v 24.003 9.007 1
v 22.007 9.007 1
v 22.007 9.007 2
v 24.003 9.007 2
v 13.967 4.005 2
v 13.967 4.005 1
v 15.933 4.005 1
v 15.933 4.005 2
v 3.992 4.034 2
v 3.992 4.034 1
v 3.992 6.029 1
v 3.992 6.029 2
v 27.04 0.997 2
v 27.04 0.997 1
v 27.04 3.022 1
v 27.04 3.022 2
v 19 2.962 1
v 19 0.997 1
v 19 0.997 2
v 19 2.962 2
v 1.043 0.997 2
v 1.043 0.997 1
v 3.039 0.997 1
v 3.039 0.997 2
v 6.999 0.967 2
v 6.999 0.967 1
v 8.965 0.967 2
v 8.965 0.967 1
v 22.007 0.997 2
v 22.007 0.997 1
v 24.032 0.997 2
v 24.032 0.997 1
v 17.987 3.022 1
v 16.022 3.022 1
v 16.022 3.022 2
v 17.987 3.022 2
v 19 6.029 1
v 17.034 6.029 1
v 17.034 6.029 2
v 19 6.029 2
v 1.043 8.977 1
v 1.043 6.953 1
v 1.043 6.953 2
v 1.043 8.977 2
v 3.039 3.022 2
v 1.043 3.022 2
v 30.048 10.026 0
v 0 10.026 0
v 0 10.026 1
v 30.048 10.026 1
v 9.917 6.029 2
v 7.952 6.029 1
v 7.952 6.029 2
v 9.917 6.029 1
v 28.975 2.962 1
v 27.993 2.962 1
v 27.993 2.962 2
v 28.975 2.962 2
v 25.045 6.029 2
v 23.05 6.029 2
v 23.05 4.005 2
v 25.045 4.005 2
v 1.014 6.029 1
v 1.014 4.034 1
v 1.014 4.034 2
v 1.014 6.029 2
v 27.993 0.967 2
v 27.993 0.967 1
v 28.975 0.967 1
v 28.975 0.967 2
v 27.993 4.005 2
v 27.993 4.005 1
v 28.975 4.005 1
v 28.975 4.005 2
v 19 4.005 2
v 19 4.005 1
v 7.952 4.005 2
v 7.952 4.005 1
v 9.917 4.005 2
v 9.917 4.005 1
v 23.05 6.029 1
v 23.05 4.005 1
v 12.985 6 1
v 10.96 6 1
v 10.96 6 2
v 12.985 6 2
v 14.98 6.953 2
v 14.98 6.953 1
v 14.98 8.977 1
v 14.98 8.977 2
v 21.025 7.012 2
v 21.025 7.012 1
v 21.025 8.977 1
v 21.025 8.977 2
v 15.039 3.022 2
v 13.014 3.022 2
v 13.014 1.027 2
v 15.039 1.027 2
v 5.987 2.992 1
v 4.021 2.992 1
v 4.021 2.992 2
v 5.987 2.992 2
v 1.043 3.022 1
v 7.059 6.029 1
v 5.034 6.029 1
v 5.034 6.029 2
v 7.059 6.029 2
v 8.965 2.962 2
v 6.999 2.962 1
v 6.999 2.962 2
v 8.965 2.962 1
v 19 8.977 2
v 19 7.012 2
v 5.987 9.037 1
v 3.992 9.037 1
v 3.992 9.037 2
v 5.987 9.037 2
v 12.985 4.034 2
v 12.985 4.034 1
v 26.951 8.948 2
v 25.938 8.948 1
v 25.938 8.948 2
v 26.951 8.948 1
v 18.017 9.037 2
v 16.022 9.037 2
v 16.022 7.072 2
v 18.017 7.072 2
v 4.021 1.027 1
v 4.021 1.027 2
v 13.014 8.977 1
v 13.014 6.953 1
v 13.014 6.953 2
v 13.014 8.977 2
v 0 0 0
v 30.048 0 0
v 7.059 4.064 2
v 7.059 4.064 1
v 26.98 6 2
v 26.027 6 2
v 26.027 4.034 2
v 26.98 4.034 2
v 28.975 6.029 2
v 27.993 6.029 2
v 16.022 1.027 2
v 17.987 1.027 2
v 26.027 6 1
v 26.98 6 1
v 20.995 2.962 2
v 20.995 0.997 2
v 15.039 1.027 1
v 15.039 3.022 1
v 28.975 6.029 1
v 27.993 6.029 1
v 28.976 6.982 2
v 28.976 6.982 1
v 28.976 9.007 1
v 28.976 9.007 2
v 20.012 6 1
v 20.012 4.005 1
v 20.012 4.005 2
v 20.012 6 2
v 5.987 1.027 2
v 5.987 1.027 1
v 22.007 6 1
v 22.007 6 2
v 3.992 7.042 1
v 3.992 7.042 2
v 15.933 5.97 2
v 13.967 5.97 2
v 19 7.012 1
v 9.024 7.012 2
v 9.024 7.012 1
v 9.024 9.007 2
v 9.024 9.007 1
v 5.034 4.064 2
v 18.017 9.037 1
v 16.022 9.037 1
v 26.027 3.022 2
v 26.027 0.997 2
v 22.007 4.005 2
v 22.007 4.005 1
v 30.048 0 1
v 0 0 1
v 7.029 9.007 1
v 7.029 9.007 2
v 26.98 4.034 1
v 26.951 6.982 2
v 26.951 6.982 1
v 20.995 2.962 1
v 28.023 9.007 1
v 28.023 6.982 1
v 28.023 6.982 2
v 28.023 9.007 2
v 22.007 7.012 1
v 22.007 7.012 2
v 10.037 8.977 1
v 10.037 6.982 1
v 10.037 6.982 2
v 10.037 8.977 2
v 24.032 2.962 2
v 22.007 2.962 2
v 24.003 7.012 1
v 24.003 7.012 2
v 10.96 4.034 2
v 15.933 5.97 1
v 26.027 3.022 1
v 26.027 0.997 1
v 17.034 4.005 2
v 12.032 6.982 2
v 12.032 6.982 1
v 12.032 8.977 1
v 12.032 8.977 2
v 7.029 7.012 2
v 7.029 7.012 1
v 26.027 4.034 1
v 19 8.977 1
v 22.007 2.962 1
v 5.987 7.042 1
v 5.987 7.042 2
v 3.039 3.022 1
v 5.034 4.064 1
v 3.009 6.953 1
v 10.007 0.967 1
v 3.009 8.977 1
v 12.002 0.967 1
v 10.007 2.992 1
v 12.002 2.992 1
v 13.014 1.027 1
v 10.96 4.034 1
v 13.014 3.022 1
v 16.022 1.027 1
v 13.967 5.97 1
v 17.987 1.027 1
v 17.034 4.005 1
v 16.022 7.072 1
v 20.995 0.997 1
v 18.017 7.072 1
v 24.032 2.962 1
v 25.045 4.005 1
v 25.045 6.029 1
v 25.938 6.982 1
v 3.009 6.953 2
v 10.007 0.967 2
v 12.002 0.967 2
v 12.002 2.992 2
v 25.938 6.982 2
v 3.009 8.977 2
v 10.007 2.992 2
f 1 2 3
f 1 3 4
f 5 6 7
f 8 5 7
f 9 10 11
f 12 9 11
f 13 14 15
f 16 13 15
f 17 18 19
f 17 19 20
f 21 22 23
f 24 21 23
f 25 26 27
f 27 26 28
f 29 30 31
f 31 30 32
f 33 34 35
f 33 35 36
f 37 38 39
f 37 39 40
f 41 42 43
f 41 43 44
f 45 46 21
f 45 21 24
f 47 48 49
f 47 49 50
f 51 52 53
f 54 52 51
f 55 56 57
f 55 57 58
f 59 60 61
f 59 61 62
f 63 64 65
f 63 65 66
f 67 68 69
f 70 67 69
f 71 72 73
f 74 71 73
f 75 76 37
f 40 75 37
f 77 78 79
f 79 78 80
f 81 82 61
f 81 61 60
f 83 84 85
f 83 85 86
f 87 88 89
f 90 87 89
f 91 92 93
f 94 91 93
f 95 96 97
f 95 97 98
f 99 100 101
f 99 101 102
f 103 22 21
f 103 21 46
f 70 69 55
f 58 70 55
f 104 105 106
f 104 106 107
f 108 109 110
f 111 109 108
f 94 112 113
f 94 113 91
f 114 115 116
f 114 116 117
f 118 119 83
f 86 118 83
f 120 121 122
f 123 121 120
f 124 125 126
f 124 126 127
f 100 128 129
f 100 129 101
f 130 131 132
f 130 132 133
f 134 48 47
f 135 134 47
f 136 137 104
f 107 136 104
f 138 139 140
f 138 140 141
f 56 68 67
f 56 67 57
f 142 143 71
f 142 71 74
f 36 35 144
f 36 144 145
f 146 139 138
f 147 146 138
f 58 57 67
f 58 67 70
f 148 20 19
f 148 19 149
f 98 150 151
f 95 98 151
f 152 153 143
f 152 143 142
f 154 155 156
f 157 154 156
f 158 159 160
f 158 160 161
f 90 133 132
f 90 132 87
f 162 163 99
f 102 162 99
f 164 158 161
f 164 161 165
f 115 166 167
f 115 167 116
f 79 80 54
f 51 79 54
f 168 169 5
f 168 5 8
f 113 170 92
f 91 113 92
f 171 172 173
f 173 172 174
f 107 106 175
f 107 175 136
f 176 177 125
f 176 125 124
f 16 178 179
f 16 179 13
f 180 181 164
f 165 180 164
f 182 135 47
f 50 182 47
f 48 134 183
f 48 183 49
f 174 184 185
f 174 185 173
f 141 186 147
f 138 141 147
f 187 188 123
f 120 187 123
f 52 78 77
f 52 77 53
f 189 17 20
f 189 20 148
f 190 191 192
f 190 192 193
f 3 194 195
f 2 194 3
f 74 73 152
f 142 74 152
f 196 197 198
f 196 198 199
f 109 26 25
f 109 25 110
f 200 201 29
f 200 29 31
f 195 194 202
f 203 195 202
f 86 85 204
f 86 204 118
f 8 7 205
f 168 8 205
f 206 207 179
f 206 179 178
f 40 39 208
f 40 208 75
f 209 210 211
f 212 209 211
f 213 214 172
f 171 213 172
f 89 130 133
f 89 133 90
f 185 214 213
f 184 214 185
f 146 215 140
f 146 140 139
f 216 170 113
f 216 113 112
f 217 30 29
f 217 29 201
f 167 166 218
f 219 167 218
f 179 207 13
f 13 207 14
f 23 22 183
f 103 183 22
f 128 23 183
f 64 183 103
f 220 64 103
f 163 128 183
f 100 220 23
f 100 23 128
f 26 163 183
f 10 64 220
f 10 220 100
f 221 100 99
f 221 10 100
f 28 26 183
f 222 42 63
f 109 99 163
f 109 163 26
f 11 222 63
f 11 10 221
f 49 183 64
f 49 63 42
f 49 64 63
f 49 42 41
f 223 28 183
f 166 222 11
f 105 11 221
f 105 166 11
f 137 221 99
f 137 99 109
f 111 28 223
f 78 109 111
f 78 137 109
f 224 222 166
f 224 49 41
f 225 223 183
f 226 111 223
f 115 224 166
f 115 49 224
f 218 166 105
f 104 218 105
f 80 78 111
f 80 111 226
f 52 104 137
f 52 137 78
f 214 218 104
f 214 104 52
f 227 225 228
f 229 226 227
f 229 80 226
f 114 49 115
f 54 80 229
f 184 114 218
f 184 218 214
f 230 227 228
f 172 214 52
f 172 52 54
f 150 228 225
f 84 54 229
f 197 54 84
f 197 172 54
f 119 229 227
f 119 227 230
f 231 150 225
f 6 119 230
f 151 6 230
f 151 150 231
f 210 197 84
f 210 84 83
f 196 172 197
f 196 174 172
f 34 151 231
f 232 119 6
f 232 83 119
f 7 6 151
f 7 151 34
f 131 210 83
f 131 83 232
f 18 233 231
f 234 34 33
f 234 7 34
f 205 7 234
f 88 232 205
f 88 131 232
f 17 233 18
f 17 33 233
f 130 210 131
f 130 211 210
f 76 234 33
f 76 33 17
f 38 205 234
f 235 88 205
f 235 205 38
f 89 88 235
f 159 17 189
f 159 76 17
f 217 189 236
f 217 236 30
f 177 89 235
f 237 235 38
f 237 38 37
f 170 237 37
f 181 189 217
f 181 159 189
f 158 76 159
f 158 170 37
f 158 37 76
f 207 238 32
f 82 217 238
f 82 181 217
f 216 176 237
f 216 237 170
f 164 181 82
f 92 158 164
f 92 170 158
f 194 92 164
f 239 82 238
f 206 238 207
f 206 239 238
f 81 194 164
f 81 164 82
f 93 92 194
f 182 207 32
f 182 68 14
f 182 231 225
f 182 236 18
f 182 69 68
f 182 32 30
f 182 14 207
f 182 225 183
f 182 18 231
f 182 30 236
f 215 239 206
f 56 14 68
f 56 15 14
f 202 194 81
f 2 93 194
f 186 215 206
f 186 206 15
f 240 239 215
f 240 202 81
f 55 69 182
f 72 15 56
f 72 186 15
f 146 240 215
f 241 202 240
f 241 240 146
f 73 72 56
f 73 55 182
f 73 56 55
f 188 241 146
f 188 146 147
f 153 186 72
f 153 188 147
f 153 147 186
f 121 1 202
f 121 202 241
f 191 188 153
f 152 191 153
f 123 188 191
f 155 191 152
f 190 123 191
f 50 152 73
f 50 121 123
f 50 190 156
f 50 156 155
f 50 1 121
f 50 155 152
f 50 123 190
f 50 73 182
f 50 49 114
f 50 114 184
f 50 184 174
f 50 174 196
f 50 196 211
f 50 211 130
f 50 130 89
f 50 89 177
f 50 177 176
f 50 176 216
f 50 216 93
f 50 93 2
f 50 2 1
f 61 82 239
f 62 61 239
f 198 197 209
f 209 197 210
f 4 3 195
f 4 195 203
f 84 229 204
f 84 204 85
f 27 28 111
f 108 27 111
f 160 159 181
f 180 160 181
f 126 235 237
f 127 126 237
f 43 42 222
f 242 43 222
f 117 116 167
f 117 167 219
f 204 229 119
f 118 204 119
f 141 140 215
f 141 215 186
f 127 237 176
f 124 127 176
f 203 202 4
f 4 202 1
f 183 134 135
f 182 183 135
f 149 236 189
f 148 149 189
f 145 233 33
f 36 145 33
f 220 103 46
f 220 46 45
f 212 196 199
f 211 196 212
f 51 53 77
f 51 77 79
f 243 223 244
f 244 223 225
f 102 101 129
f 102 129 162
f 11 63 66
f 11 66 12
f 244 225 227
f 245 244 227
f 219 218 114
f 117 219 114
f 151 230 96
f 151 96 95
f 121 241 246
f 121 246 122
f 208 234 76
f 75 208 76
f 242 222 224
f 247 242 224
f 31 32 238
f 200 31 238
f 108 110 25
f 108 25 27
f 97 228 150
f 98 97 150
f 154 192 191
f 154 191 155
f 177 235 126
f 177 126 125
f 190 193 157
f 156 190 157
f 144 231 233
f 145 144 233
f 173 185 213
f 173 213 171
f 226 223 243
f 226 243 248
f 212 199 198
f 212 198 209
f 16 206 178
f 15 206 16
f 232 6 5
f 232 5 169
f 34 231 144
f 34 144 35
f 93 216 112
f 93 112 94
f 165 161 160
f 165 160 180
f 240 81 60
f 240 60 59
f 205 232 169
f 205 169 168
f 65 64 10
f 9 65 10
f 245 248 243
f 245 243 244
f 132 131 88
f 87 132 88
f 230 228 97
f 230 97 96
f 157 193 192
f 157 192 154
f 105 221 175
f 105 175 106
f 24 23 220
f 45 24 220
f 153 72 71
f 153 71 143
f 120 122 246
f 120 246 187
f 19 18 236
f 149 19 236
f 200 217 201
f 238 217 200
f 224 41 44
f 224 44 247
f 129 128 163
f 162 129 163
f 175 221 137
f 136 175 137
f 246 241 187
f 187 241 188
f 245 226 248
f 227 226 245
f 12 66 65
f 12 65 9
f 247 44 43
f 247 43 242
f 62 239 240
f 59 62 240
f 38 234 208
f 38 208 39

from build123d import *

# Parameters (mm, degrees)
SKETCH_W       = 30.047779
SKETCH_H       = 10.025875
PAD_DEPTH      = 1
SKETCH001_W    = 1.995144
SKETCH001_H    = 2.024921
SKETCH001_W_2  = 1.965365
SKETCH001_H_2  = 1.965365
SKETCH001_W_3  = 1.965363
SKETCH001_H_3  = 1.995143
SKETCH001_W_4  = 1.995143
SKETCH001_W_5  = 2.024922
SKETCH001_W_6  = 1.965367
SKETCH001_W_7  = 1.995147
SKETCH001_W_8  = 0.982683
SKETCH001_W_9  = 1.012457
SKETCH001_W_10 = 0.952904
SKETCH001_H_4  = 2.024922
SKETCH001_W_11 = 1.012463
SKETCH001_H_5  = 1.965366
SKETCH001_W_12 = 0.952906
SKETCH001_W_13 = 2.977825
SKETCH001_W_14 = 1.965366
SKETCH001_H_6  = 1.995144
SKETCH001_W_15 = 2.024921
SKETCH001_W_16 = 1.965361
SKETCH001_W_17 = 1.99514
SKETCH001_W_18 = 1.965362
SKETCH001_W_19 = 2.024923
SKETCH001_H_7  = 1.965364
SKETCH001_W_20 = 1.995142
PAD001_DEPTH   = 1


with BuildPart() as part:
    # Sketch → Pad (new body)
    with BuildSketch(Plane.XY):
        with Locations((15.023889, 5.012937)):
            Rectangle(SKETCH_W, SKETCH_H)
    extrude(amount=PAD_DEPTH)

    # Sketch001 (on Face6 of Pad) → Pad001 (join)
    with BuildSketch(Plane.XY.offset(1)):
        with Locations((2.041063, 2.009386)):
            Rectangle(SKETCH001_W, SKETCH001_H)
        with Locations((5.003999, 2.009385)):
            Rectangle(SKETCH001_W_2, SKETCH001_H_2)
        with Locations((7.981825, 1.964719)):
            Rectangle(SKETCH001_W_3, SKETCH001_H_3)
        with Locations((11.004319, 1.979607)):
            Rectangle(SKETCH001_W_4, SKETCH001_H)
        with Locations((14.026814, 2.024274)):
            Rectangle(SKETCH001_W_5, SKETCH001_H_3)
        with Locations((17.004638, 2.024274)):
            Rectangle(SKETCH001_W_6, SKETCH001_H_3)
        with Locations((19.997352, 1.979607)):
            Rectangle(SKETCH001_W_7, SKETCH001_H_2)
        with Locations((23.019848, 1.979607)):
            Rectangle(SKETCH001_W_5, SKETCH001_H_2)
        with Locations((28.484158, 1.964719)):
            Rectangle(SKETCH001_W_8, SKETCH001_H_3)
        with Locations((26.53368, 2.009386)):
            Rectangle(SKETCH001_W_9, SKETCH001_H)
        with Locations((26.503904, 5.016991)):
            Rectangle(SKETCH001_W_10, SKETCH001_H_2)
        with Locations((28.484158, 5.01699)):
            Rectangle(SKETCH001_W_8, SKETCH001_H_4)
        with Locations((26.444347, 7.965038)):
            Rectangle(SKETCH001_W_11, SKETCH001_H_5)
        with Locations((28.499047, 7.994816)):
            Rectangle(SKETCH001_W_12, SKETCH001_H_4)
        with Locations((2.502625, 5.03188)):
            Rectangle(SKETCH001_W_13, SKETCH001_H_3)
        with Locations((2.026174, 7.965037)):
            Rectangle(SKETCH001_W_14, SKETCH001_H)
        with Locations((4.98911, 8.039484)):
            Rectangle(SKETCH001_W, SKETCH001_H_6)
        with Locations((6.04624, 5.046768)):
            Rectangle(SKETCH001_W_15, SKETCH001_H_2)
        with Locations((8.934731, 5.01699)):
            Rectangle(SKETCH001_W_2, SKETCH001_H_4)
        with Locations((11.972112, 5.016991)):
            Rectangle(SKETCH001_W_15, SKETCH001_H_2)
        with Locations((14.94994, 4.987212)):
            Rectangle(SKETCH001_W_14, SKETCH001_H_5)
        with Locations((18.017098, 5.01699)):
            Rectangle(SKETCH001_W_16, SKETCH001_H_4)
        with Locations((21.009815, 5.002101)):
            Rectangle(SKETCH001_W, SKETCH001_H_6)
        with Locations((24.047197, 5.01699)):
            Rectangle(SKETCH001_W_17, SKETCH001_H_4)
        with Locations((8.026494, 8.009705)):
            Rectangle(SKETCH001_W, SKETCH001_H_3)
        with Locations((11.034097, 7.979926)):
            Rectangle(SKETCH001_W_4, SKETCH001_H_3)
        with Locations((13.997034, 7.965037)):
            Rectangle(SKETCH001_W_18, SKETCH001_H)
        with Locations((17.019527, 8.054373)):
            Rectangle(SKETCH001_W, SKETCH001_H_5)
        with Locations((20.01224, 7.994816)):
            Rectangle(SKETCH001_W_19, SKETCH001_H_7)
        with Locations((23.004958, 8.009705)):
            Rectangle(SKETCH001_W_20, SKETCH001_H_3)
    extrude(amount=PAD001_DEPTH)


solid = part.part
